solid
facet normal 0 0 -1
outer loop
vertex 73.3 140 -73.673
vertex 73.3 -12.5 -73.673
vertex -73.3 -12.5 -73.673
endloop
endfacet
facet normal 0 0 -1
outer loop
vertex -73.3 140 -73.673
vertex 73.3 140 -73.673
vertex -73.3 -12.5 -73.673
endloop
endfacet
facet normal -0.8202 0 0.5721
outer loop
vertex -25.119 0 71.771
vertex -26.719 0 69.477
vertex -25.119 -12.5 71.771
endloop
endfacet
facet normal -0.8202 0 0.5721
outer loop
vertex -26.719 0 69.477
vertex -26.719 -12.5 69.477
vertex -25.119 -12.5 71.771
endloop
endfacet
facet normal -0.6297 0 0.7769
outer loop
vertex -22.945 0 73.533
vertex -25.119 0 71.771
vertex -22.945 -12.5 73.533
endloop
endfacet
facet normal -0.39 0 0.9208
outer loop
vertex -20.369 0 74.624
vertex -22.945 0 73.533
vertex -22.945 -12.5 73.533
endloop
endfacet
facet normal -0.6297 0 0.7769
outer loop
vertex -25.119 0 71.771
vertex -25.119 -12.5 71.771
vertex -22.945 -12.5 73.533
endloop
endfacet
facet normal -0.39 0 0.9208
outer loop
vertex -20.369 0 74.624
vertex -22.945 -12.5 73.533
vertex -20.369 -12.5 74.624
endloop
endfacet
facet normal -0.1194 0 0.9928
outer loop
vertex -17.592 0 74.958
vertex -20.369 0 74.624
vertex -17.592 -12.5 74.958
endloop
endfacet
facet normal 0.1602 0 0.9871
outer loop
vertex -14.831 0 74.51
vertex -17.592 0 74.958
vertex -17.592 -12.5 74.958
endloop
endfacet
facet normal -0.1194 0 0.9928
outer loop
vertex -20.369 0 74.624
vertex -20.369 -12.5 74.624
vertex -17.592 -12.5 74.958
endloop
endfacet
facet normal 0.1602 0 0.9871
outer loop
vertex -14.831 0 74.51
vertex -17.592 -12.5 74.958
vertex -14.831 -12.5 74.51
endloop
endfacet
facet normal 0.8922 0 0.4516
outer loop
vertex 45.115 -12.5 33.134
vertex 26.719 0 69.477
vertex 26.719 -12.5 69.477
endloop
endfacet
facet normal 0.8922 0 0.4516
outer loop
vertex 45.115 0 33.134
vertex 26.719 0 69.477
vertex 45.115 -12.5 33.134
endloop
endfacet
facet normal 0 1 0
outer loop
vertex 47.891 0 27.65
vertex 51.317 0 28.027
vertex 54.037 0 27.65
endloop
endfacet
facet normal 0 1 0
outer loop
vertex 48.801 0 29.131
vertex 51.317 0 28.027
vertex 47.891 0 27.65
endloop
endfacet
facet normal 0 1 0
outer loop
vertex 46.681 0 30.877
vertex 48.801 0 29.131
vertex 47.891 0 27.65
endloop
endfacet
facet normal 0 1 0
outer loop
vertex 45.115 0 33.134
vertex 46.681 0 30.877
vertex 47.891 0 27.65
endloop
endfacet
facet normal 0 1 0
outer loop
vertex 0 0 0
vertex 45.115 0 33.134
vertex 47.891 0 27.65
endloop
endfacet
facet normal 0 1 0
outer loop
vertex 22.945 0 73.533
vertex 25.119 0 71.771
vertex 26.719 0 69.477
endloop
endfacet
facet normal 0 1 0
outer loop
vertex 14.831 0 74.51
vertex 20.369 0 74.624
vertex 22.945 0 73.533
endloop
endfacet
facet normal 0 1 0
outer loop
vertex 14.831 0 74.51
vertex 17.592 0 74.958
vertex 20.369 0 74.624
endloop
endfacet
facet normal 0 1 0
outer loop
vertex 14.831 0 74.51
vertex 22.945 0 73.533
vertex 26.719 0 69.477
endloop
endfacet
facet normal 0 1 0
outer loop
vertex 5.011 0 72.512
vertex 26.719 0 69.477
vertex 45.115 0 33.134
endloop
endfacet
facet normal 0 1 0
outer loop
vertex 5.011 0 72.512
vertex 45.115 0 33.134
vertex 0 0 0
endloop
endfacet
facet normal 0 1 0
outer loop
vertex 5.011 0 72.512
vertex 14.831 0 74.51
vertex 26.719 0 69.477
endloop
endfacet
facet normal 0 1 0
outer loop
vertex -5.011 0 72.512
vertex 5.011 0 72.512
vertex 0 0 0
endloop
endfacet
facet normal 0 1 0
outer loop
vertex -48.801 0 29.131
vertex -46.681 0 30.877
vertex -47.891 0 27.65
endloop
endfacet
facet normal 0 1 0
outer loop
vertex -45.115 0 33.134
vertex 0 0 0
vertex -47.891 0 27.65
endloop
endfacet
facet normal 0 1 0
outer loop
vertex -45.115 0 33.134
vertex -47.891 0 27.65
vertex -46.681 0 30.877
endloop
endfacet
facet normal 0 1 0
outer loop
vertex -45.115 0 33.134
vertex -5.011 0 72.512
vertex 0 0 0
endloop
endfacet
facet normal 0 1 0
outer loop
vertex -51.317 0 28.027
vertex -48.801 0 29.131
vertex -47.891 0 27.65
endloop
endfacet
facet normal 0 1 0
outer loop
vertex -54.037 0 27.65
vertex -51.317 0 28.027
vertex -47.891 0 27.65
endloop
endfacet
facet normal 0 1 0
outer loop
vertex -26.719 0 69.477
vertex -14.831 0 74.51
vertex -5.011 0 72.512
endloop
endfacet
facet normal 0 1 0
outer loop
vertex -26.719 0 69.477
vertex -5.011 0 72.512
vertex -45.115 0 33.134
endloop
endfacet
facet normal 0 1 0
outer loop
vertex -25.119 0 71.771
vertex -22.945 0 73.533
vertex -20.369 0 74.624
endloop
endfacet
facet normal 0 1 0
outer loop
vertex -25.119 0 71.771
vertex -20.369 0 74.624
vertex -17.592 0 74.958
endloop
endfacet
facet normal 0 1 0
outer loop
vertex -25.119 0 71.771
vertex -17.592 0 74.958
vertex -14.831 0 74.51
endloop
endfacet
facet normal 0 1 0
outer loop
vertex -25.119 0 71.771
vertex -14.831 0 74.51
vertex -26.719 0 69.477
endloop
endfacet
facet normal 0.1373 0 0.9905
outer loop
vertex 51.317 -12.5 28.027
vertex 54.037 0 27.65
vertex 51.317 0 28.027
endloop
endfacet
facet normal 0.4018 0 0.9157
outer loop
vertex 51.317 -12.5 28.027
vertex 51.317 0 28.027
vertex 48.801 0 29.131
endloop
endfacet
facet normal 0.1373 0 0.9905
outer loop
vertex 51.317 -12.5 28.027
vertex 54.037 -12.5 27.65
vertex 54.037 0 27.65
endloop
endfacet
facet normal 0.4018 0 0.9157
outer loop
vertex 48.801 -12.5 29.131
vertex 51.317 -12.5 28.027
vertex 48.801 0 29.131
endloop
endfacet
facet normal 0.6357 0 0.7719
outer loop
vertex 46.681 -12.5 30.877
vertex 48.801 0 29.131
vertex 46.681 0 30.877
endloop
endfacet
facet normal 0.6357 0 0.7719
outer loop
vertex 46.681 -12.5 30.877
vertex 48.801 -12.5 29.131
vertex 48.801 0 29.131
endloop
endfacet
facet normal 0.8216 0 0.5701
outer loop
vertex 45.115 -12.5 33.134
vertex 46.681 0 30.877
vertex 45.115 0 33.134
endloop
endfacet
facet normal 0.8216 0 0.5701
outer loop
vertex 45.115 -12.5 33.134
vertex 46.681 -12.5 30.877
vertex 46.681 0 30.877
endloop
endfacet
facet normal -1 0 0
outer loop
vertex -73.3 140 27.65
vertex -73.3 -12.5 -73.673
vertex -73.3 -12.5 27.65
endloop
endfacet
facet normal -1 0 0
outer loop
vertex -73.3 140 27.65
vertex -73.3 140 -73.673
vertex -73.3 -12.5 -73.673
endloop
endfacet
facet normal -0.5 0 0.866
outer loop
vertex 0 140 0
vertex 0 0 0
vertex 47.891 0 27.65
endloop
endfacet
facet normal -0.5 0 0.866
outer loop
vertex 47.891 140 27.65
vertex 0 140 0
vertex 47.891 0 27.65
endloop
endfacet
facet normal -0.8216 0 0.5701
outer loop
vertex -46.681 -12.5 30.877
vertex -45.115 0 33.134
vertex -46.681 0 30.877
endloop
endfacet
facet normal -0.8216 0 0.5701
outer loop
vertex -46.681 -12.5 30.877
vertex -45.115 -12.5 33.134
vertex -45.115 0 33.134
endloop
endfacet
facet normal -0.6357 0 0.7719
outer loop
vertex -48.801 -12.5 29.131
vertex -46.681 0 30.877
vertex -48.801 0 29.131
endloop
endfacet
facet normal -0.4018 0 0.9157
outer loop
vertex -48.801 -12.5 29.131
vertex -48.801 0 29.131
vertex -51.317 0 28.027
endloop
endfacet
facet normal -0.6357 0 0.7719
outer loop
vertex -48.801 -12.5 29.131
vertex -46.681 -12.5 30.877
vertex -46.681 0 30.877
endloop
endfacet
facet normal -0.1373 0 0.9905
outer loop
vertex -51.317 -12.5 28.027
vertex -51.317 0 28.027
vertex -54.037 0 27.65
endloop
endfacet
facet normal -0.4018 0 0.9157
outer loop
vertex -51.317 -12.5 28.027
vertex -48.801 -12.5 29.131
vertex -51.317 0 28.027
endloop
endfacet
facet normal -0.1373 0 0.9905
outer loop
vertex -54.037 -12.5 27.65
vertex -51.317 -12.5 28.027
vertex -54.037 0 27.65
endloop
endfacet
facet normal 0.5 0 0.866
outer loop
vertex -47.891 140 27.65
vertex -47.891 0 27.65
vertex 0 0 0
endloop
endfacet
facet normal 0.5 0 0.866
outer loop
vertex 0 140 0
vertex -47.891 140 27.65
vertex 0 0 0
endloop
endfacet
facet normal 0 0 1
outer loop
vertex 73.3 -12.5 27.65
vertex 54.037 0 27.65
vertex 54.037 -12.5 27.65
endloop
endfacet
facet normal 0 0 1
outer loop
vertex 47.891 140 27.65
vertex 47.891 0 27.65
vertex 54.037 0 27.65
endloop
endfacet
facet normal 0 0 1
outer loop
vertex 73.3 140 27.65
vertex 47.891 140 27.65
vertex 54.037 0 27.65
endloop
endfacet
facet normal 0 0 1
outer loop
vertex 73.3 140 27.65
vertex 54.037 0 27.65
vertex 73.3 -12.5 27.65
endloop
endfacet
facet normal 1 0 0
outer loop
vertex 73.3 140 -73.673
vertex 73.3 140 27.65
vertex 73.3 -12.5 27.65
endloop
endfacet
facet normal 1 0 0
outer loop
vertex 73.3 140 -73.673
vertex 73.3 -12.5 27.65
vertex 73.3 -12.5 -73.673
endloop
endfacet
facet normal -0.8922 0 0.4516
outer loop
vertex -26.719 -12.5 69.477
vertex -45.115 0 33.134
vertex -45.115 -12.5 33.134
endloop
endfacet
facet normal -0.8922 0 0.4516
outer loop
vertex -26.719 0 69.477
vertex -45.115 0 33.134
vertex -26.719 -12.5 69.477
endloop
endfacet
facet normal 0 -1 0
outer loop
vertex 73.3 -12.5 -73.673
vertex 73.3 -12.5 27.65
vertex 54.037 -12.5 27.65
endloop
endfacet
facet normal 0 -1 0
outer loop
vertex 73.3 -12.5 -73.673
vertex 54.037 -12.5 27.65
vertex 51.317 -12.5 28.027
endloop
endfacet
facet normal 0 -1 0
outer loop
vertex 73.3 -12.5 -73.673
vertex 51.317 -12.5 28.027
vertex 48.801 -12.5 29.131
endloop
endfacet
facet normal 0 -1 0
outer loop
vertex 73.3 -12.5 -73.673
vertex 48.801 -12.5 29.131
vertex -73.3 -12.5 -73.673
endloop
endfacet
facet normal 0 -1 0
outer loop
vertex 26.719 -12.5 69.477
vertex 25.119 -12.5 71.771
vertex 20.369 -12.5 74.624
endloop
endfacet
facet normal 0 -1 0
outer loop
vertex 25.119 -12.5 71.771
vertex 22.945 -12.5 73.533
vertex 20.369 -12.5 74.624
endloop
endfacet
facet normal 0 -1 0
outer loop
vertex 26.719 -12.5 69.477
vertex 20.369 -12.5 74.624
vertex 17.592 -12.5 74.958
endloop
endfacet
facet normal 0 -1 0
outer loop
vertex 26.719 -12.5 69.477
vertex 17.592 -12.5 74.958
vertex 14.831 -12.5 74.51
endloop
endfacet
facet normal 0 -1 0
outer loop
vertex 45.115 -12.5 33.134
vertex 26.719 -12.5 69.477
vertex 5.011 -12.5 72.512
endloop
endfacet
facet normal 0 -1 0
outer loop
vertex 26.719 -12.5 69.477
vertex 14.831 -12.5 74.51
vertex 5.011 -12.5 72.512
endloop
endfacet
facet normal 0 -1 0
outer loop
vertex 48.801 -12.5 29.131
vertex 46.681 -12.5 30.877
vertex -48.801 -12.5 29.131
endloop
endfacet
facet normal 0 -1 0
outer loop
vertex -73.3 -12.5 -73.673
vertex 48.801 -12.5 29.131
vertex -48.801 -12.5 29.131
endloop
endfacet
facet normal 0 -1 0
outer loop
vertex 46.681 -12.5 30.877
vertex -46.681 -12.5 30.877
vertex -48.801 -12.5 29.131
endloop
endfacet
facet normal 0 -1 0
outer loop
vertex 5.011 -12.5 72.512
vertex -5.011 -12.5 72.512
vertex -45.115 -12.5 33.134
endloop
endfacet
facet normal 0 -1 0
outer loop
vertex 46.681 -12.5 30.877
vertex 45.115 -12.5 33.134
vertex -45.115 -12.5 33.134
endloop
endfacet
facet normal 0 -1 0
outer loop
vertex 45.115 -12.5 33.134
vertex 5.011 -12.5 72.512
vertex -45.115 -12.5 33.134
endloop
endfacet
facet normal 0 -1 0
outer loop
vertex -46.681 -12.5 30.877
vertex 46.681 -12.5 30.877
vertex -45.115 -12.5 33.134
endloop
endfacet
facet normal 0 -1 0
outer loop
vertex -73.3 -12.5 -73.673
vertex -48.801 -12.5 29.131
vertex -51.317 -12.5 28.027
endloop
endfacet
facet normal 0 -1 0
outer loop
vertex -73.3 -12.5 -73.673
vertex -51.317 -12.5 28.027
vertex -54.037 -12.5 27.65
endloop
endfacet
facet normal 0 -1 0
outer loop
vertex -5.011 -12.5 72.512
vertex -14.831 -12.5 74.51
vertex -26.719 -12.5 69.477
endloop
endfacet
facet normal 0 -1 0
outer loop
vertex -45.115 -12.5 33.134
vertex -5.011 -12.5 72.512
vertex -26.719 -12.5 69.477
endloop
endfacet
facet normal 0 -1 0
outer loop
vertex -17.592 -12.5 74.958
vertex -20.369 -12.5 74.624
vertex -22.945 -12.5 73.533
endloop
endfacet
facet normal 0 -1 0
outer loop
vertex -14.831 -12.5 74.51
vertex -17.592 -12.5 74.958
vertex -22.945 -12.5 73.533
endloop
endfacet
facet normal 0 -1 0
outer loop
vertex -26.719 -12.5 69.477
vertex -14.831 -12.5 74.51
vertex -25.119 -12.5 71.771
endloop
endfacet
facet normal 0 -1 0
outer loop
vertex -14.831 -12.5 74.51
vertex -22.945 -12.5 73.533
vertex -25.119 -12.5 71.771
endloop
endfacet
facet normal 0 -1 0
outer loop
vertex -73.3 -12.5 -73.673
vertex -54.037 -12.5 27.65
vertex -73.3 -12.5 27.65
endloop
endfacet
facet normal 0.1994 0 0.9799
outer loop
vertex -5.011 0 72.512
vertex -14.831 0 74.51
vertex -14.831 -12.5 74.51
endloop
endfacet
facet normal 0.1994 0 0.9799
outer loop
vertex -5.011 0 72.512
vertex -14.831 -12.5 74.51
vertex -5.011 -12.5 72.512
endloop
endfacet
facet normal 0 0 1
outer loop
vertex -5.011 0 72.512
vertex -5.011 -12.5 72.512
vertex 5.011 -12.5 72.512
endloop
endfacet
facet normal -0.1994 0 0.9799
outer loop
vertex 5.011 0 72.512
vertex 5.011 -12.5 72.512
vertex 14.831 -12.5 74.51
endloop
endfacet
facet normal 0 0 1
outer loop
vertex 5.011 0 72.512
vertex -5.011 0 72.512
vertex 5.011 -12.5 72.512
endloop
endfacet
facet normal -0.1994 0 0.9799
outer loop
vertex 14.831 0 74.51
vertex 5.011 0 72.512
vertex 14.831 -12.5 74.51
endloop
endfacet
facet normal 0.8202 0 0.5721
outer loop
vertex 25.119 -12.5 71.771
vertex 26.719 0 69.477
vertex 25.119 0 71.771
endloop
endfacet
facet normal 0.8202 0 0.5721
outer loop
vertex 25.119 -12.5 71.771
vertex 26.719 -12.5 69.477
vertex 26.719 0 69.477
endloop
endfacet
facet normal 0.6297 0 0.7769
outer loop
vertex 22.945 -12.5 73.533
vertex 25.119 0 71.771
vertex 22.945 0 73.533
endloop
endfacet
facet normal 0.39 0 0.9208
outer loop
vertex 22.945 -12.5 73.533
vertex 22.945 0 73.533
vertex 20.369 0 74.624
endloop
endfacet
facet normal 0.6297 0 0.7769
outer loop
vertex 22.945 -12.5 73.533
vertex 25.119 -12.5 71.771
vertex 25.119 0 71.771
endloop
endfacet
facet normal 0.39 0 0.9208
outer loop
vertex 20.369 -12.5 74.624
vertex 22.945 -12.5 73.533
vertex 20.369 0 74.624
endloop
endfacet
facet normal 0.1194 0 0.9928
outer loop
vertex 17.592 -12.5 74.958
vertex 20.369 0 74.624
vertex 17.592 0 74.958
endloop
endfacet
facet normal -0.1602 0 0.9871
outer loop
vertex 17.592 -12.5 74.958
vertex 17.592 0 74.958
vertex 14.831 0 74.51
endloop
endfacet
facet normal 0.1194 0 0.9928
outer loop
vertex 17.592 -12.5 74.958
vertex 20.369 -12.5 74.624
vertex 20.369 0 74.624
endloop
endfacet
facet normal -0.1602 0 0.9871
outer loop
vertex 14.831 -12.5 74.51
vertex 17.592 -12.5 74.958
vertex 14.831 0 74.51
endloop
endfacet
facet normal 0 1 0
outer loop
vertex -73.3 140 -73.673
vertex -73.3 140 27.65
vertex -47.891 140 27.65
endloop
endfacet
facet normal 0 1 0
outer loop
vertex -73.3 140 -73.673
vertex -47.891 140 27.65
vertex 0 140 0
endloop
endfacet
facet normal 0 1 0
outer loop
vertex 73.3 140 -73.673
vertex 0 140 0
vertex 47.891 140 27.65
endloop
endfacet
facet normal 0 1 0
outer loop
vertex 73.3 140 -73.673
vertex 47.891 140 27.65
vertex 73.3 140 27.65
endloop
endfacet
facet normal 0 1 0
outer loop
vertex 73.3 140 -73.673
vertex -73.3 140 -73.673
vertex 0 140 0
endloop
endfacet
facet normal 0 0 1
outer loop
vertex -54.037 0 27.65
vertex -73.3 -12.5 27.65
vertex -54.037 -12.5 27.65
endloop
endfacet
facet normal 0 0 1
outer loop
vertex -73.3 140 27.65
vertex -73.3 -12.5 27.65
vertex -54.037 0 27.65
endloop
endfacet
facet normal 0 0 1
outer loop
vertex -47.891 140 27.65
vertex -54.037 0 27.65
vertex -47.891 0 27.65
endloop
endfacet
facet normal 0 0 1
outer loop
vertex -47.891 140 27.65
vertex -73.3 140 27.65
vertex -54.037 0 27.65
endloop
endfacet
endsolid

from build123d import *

# Parameters (mm, degrees)
BOSS_EXTRUDE1_DEPTH = 140
BOSS_EXTRUDE2_DEPTH = 12.5
FILLET1_R           = 10


with BuildPart() as part:
    # Sketch1 → Boss-Extrude1 (new body)
    with BuildSketch(Plane(origin=(0, 0, 0), x_dir=(1, 0, 0), z_dir=(0, 1, 0))):
        Polygon((0, 0), (47.891204829, -27.65), (73.3, -27.65), (73.3, 73.672860643), (-73.3, 73.672860643), (-73.3, -27.65), (-47.891204829, -27.65), align=None)
    extrude(amount=BOSS_EXTRUDE1_DEPTH)

    # Sketch3 → Boss-Extrude2 (add)
    with BuildSketch(Plane.XZ):
        with BuildLine():
            Line((-47.891204829, 27.65), (-22.581478328, 77.65))
            ThreePointArc((-22.581478328, 77.65), (0, 72.260277252), (22.581478328, 77.65))
            Line((22.581478328, 77.65), (47.891204829, 27.65))
            Line((47.891204829, 27.65), (73.3, 27.65))
            Line((73.3, 27.65), (73.3, -73.672860643))
            Line((73.3, -73.672860643), (-73.3, -73.672860643))
            Line((-73.3, -73.672860643), (-73.3, 27.65))
            Line((-73.3, 27.65), (-47.891204829, 27.65))
        make_face()
    extrude(amount=BOSS_EXTRUDE2_DEPTH)

    # Fillet1
    fillet1_edges = [part.edges().sort_by_distance(p)[0] for p in [
        (-47.891204829, -6.25, 27.65),
        (47.891204829, -6.25, 27.65),
        (22.581478328, -6.25, 77.65),
        (-22.581478328, -6.25, 77.65),
    ]]
    fillet(fillet1_edges, radius=FILLET1_R)


solid = part.part
